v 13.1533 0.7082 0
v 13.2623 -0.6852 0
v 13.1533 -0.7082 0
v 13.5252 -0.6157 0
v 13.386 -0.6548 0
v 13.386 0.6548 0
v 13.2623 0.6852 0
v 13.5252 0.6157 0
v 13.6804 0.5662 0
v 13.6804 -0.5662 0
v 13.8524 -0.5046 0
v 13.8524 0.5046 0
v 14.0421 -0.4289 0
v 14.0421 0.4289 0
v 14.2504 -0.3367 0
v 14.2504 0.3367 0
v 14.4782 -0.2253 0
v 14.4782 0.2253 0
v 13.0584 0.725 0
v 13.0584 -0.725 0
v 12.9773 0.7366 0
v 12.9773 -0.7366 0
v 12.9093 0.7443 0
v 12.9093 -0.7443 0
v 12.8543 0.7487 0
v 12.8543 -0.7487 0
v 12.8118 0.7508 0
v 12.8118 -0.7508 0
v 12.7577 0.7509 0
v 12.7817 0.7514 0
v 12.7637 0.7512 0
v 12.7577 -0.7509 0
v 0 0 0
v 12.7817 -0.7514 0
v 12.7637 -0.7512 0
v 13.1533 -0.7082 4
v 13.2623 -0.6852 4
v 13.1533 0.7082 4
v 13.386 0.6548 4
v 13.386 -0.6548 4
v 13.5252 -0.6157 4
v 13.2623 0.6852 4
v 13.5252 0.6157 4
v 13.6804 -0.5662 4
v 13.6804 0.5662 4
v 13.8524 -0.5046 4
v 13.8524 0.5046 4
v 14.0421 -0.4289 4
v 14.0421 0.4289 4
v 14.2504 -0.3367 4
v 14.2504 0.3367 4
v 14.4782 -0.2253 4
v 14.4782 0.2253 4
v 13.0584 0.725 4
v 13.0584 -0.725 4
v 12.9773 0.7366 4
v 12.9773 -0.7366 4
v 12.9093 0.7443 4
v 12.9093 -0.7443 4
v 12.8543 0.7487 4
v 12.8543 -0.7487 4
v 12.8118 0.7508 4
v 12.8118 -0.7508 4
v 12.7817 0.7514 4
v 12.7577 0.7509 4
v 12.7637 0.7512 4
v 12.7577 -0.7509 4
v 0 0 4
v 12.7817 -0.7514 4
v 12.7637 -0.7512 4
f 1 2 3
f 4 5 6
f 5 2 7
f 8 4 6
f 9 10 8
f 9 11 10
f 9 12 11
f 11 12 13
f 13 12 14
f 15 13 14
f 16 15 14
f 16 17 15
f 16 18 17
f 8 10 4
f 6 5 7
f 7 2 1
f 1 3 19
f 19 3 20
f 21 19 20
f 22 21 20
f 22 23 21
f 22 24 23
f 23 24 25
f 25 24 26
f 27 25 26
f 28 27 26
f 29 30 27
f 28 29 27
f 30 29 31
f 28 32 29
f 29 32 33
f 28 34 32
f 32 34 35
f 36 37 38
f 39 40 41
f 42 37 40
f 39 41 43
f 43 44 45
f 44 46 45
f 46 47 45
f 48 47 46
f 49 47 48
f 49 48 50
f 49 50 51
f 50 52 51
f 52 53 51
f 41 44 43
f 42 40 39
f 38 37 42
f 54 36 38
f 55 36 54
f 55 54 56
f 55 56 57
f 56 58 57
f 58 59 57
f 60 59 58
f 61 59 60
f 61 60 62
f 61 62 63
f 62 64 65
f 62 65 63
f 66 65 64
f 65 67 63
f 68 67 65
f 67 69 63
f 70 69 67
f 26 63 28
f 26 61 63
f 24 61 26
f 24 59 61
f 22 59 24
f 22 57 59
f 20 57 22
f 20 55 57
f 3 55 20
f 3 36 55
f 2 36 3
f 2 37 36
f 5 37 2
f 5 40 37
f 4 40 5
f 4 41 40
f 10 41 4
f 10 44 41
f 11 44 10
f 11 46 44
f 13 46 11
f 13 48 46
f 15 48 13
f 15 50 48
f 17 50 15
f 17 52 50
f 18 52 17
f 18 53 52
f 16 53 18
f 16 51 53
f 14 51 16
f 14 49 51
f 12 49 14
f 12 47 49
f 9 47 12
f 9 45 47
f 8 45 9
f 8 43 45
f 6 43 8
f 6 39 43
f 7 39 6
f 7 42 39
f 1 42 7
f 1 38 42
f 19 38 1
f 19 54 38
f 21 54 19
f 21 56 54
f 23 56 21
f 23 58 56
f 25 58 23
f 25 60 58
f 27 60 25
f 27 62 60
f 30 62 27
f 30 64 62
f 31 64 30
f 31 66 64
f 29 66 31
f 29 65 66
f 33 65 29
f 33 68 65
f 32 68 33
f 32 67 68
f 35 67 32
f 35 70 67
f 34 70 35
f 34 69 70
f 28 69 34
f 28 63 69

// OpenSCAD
// file: ../../../src/common/common_params.scad
/***
 * @module Common Parameters
 * @brief Shared constants and tolerances used by the CurveGears implementation.
 *
 * Historical constants are retained for numerical compatibility.
 */
// Historical constants are retained for numerical compatibility.
_cg_pi = 3.14159;
_cg_deg_per_rad = 57.29578;
_cg_tolerance = 1e-7;
_cg_default_fn = 50;
_cg_circle_pi = 3.141592653589793;
// file: ../../../src/common/common_math.scad
/***
 * @module Common Math
 * @brief Shared scalar, angle and vector helpers used by the geometry layers.
 *
 * These functions are internal implementation primitives and are not part of
 * the public family API.
 */
include <common_params.scad>

/*** @function _cg_degrees(angle)
 * @brief Convert radians to degrees.
 * @param angle {number} Angle in radians.
 * @return {number} Angle in degrees.
 */
function _cg_degrees(angle) = angle*_cg_deg_per_rad;
/*** @function _cg_radians(angle)
 * @brief Convert degrees to radians.
 * @param angle {number} Angle in degrees.
 * @return {number} Angle in radians.
 */
function _cg_radians(angle) = angle/_cg_deg_per_rad;
/*** @function _cg_polar(p)
 * @brief Convert a polar `[radius, angle]` pair to Cartesian coordinates.
 * @param p {array} Polar pair with angle in degrees.
 * @return {array} Cartesian point `[x, y]`.
 */
function _cg_polar(p) = [p[0]*cos(p[1]),p[0]*sin(p[1])];

/*** @function _cg_vsub(a, b)
 * @brief Subtract one two-dimensional vector from another.
 * @param a {array} Left-hand vector.
 * @param b {array} Right-hand vector.
 * @return {array} Difference vector.
 */
function _cg_vsub(a,b) = [a[0]-b[0], a[1]-b[1]];
/*** @function _cg_vlen(a)
 * @brief Calculate the Euclidean length of a two-dimensional vector.
 * @param a {array} Vector.
 * @return {number} Vector length.
 */
function _cg_vlen(a) = sqrt(a[0]*a[0] + a[1]*a[1]);
/*** @function _cg_vunit(a)
 * @brief Normalise a two-dimensional vector, returning zero for a zero vector.
 * @param a {array} Vector.
 * @return {array} Unit vector or `[0, 0]`.
 */
function _cg_vunit(a) = let(l=_cg_vlen(a)) l == 0 ? [0,0] : [a[0]/l,a[1]/l];
/*** @function _cg_lerp(a, b, t)
 * @brief Linearly interpolate between two scalar values.
 * @param a {number} Start value.
 * @param b {number} End value.
 * @param t {number} Interpolation fraction.
 * @return {number} Interpolated value.
 */
function _cg_lerp(a,b,t) = a + t*(b-a);
/*** @function _cg_vlerp(a, b, t)
 * @brief Linearly interpolate between two two-dimensional vectors.
 * @param a {array} Start vector.
 * @param b {array} End vector.
 * @param t {number} Interpolation fraction.
 * @return {array} Interpolated vector.
 */
function _cg_vlerp(a,b,t) = [_cg_lerp(a[0],b[0],t), _cg_lerp(a[1],b[1],t)];
/*** @function _cg_cross2(a, b)
 * @brief Calculate the scalar two-dimensional cross product.
 * @param a {array} First vector.
 * @param b {array} Second vector.
 * @return {number} Signed cross-product magnitude.
 */
function _cg_cross2(a,b) = a[0]*b[1]-a[1]*b[0];
/*** @function _cg_sum(v, i, acc)
 * @brief Sum a scalar array recursively.
 * @param v {array} Scalar values.
 * @param i {integer, default 0} Current index.
 * @param acc {number, default 0} Accumulated sum.
 * @return {number} Sum of the values.
 */
function _cg_sum(v,i=0,acc=0) = i >= len(v) ? acc : _cg_sum(v,i+1,acc+v[i]);
/*** @function _cg_prefix_sums(v, i, acc, out)
 * @brief Build inclusive prefix sums for a scalar array.
 * @param v {array} Scalar values.
 * @param i {integer, default 0} Current index.
 * @param acc {number, default 0} Accumulated sum.
 * @param out {array, default [0]} Prefix-sum output under construction.
 * @return {array} Prefix sums beginning with zero.
 */
function _cg_prefix_sums(v,i=0,acc=0,out=[0]) =
    i >= len(v) ? out : _cg_prefix_sums(v,i+1,acc+v[i],concat(out,[acc+v[i]]));

/*** @function _cg_interp_x_for_y(tab, target, i)
 * @brief Interpolate an x value at a monotonic y target in a two-column table.
 * @param tab {array} Table of `[x, y]` samples.
 * @param target {number} Target y value.
 * @param i {integer, default 0} Search index.
 * @return {number} Interpolated x value.
 */
function _cg_interp_x_for_y(tab,target,i=0) =
    i >= len(tab)-1 ? tab[len(tab)-1][0] :
    (tab[i][1] <= target && tab[i+1][1] >= target && tab[i+1][1] > tab[i][1]
        ? let(y0=tab[i][1], y1=tab[i+1][1], f=(target-y0)/(y1-y0))
          _cg_lerp(tab[i][0],tab[i+1][0],f)
        : _cg_interp_x_for_y(tab,target,i+1));

/*** @function _cg_interp_y_for_x(tab, target, i)
 * @brief Interpolate a y value at a monotonic x target in a two-column table.
 * @param tab {array} Table of `[x, y]` samples.
 * @param target {number} Target x value.
 * @param i {integer, default 0} Search index.
 * @return {number} Interpolated y value.
 */
function _cg_interp_y_for_x(tab,target,i=0) =
    i >= len(tab)-1 ? tab[len(tab)-1][1] :
    (tab[i][0] <= target && tab[i+1][0] >= target && tab[i+1][0] > tab[i][0]
        ? let(x0=tab[i][0], x1=tab[i+1][0], f=(target-x0)/(x1-x0))
          _cg_lerp(tab[i][1],tab[i+1][1],f)
        : _cg_interp_y_for_x(tab,target,i+1));
/***
 * @module Mathematical References
 * @brief Mathematical sources used by the CurveGears families.
 * The ellipse uses the standard parametric ellipse. The lobed family uses a
 * sinusoidally modulated polar radius. The Pascal family uses Pascal's
 * limaçon. The logarithmic spiral follows the standard logarithmic spiral.
 * The epitrochoid follows the rolling-circle construction. The superformula
 * follows Johan Gielis, “A generic geometric transformation that unifies a
 * wide range of natural and abstract shapes”, American Journal of Botany
 * 90(3), 333–338 (2003), DOI 10.3732/ajb.90.3.333.
 * References: https://doi.org/10.3732/ajb.90.3.333
 * Pascal limaçon: https://mathworld.wolfram.com/Limacon.html
 * Logarithmic spiral: https://mathworld.wolfram.com/LogarithmicSpiral.html
 * Epitrochoid: https://mathworld.wolfram.com/Epitrochoid.html
 */
// main file
/***
 * @function tooth_generation_candidate_pipeline
 * @brief Render the current cached candidate tooth in the same local frame.
 * Source: [`tooth/generation/candidate_pipeline.scad`](tooth/generation/candidate_pipeline.scad)
 *
 * The inward support segment exists only to establish curved-body splices.
 * Compare the active reference involute/top profile, including its historical
 * centre sentinel, so this STL remains a mathematical equivalence check.
 */
include <../../../src/common/curve_gears_math.scad>

$fn=96;
modul=.8;
tooth_number=34;
candidate=_cg_reference_tooth_candidate(modul*tooth_number/2,modul,tooth_number,20);
assert(candidate[0],str("candidate tooth invalid: ",candidate[1]));
left=candidate[4];
right=candidate[5];
left_start=left[0][0] < left[1][0]-_cg_eps_len() ? 1 : 0;
right_start=right[0][0] < right[1][0]-_cg_eps_len() ? 1 : 0;
reference_profile=concat(
    [[0,0]],
    [for(i=[left_start:len(left)-2]) left[i]],
    [candidate[6],candidate[7]],
    [for(i=[len(right)-2:-1:right_start]) right[i]]
);
linear_extrude(height=4,convexity=4)
    polygon(reference_profile);
